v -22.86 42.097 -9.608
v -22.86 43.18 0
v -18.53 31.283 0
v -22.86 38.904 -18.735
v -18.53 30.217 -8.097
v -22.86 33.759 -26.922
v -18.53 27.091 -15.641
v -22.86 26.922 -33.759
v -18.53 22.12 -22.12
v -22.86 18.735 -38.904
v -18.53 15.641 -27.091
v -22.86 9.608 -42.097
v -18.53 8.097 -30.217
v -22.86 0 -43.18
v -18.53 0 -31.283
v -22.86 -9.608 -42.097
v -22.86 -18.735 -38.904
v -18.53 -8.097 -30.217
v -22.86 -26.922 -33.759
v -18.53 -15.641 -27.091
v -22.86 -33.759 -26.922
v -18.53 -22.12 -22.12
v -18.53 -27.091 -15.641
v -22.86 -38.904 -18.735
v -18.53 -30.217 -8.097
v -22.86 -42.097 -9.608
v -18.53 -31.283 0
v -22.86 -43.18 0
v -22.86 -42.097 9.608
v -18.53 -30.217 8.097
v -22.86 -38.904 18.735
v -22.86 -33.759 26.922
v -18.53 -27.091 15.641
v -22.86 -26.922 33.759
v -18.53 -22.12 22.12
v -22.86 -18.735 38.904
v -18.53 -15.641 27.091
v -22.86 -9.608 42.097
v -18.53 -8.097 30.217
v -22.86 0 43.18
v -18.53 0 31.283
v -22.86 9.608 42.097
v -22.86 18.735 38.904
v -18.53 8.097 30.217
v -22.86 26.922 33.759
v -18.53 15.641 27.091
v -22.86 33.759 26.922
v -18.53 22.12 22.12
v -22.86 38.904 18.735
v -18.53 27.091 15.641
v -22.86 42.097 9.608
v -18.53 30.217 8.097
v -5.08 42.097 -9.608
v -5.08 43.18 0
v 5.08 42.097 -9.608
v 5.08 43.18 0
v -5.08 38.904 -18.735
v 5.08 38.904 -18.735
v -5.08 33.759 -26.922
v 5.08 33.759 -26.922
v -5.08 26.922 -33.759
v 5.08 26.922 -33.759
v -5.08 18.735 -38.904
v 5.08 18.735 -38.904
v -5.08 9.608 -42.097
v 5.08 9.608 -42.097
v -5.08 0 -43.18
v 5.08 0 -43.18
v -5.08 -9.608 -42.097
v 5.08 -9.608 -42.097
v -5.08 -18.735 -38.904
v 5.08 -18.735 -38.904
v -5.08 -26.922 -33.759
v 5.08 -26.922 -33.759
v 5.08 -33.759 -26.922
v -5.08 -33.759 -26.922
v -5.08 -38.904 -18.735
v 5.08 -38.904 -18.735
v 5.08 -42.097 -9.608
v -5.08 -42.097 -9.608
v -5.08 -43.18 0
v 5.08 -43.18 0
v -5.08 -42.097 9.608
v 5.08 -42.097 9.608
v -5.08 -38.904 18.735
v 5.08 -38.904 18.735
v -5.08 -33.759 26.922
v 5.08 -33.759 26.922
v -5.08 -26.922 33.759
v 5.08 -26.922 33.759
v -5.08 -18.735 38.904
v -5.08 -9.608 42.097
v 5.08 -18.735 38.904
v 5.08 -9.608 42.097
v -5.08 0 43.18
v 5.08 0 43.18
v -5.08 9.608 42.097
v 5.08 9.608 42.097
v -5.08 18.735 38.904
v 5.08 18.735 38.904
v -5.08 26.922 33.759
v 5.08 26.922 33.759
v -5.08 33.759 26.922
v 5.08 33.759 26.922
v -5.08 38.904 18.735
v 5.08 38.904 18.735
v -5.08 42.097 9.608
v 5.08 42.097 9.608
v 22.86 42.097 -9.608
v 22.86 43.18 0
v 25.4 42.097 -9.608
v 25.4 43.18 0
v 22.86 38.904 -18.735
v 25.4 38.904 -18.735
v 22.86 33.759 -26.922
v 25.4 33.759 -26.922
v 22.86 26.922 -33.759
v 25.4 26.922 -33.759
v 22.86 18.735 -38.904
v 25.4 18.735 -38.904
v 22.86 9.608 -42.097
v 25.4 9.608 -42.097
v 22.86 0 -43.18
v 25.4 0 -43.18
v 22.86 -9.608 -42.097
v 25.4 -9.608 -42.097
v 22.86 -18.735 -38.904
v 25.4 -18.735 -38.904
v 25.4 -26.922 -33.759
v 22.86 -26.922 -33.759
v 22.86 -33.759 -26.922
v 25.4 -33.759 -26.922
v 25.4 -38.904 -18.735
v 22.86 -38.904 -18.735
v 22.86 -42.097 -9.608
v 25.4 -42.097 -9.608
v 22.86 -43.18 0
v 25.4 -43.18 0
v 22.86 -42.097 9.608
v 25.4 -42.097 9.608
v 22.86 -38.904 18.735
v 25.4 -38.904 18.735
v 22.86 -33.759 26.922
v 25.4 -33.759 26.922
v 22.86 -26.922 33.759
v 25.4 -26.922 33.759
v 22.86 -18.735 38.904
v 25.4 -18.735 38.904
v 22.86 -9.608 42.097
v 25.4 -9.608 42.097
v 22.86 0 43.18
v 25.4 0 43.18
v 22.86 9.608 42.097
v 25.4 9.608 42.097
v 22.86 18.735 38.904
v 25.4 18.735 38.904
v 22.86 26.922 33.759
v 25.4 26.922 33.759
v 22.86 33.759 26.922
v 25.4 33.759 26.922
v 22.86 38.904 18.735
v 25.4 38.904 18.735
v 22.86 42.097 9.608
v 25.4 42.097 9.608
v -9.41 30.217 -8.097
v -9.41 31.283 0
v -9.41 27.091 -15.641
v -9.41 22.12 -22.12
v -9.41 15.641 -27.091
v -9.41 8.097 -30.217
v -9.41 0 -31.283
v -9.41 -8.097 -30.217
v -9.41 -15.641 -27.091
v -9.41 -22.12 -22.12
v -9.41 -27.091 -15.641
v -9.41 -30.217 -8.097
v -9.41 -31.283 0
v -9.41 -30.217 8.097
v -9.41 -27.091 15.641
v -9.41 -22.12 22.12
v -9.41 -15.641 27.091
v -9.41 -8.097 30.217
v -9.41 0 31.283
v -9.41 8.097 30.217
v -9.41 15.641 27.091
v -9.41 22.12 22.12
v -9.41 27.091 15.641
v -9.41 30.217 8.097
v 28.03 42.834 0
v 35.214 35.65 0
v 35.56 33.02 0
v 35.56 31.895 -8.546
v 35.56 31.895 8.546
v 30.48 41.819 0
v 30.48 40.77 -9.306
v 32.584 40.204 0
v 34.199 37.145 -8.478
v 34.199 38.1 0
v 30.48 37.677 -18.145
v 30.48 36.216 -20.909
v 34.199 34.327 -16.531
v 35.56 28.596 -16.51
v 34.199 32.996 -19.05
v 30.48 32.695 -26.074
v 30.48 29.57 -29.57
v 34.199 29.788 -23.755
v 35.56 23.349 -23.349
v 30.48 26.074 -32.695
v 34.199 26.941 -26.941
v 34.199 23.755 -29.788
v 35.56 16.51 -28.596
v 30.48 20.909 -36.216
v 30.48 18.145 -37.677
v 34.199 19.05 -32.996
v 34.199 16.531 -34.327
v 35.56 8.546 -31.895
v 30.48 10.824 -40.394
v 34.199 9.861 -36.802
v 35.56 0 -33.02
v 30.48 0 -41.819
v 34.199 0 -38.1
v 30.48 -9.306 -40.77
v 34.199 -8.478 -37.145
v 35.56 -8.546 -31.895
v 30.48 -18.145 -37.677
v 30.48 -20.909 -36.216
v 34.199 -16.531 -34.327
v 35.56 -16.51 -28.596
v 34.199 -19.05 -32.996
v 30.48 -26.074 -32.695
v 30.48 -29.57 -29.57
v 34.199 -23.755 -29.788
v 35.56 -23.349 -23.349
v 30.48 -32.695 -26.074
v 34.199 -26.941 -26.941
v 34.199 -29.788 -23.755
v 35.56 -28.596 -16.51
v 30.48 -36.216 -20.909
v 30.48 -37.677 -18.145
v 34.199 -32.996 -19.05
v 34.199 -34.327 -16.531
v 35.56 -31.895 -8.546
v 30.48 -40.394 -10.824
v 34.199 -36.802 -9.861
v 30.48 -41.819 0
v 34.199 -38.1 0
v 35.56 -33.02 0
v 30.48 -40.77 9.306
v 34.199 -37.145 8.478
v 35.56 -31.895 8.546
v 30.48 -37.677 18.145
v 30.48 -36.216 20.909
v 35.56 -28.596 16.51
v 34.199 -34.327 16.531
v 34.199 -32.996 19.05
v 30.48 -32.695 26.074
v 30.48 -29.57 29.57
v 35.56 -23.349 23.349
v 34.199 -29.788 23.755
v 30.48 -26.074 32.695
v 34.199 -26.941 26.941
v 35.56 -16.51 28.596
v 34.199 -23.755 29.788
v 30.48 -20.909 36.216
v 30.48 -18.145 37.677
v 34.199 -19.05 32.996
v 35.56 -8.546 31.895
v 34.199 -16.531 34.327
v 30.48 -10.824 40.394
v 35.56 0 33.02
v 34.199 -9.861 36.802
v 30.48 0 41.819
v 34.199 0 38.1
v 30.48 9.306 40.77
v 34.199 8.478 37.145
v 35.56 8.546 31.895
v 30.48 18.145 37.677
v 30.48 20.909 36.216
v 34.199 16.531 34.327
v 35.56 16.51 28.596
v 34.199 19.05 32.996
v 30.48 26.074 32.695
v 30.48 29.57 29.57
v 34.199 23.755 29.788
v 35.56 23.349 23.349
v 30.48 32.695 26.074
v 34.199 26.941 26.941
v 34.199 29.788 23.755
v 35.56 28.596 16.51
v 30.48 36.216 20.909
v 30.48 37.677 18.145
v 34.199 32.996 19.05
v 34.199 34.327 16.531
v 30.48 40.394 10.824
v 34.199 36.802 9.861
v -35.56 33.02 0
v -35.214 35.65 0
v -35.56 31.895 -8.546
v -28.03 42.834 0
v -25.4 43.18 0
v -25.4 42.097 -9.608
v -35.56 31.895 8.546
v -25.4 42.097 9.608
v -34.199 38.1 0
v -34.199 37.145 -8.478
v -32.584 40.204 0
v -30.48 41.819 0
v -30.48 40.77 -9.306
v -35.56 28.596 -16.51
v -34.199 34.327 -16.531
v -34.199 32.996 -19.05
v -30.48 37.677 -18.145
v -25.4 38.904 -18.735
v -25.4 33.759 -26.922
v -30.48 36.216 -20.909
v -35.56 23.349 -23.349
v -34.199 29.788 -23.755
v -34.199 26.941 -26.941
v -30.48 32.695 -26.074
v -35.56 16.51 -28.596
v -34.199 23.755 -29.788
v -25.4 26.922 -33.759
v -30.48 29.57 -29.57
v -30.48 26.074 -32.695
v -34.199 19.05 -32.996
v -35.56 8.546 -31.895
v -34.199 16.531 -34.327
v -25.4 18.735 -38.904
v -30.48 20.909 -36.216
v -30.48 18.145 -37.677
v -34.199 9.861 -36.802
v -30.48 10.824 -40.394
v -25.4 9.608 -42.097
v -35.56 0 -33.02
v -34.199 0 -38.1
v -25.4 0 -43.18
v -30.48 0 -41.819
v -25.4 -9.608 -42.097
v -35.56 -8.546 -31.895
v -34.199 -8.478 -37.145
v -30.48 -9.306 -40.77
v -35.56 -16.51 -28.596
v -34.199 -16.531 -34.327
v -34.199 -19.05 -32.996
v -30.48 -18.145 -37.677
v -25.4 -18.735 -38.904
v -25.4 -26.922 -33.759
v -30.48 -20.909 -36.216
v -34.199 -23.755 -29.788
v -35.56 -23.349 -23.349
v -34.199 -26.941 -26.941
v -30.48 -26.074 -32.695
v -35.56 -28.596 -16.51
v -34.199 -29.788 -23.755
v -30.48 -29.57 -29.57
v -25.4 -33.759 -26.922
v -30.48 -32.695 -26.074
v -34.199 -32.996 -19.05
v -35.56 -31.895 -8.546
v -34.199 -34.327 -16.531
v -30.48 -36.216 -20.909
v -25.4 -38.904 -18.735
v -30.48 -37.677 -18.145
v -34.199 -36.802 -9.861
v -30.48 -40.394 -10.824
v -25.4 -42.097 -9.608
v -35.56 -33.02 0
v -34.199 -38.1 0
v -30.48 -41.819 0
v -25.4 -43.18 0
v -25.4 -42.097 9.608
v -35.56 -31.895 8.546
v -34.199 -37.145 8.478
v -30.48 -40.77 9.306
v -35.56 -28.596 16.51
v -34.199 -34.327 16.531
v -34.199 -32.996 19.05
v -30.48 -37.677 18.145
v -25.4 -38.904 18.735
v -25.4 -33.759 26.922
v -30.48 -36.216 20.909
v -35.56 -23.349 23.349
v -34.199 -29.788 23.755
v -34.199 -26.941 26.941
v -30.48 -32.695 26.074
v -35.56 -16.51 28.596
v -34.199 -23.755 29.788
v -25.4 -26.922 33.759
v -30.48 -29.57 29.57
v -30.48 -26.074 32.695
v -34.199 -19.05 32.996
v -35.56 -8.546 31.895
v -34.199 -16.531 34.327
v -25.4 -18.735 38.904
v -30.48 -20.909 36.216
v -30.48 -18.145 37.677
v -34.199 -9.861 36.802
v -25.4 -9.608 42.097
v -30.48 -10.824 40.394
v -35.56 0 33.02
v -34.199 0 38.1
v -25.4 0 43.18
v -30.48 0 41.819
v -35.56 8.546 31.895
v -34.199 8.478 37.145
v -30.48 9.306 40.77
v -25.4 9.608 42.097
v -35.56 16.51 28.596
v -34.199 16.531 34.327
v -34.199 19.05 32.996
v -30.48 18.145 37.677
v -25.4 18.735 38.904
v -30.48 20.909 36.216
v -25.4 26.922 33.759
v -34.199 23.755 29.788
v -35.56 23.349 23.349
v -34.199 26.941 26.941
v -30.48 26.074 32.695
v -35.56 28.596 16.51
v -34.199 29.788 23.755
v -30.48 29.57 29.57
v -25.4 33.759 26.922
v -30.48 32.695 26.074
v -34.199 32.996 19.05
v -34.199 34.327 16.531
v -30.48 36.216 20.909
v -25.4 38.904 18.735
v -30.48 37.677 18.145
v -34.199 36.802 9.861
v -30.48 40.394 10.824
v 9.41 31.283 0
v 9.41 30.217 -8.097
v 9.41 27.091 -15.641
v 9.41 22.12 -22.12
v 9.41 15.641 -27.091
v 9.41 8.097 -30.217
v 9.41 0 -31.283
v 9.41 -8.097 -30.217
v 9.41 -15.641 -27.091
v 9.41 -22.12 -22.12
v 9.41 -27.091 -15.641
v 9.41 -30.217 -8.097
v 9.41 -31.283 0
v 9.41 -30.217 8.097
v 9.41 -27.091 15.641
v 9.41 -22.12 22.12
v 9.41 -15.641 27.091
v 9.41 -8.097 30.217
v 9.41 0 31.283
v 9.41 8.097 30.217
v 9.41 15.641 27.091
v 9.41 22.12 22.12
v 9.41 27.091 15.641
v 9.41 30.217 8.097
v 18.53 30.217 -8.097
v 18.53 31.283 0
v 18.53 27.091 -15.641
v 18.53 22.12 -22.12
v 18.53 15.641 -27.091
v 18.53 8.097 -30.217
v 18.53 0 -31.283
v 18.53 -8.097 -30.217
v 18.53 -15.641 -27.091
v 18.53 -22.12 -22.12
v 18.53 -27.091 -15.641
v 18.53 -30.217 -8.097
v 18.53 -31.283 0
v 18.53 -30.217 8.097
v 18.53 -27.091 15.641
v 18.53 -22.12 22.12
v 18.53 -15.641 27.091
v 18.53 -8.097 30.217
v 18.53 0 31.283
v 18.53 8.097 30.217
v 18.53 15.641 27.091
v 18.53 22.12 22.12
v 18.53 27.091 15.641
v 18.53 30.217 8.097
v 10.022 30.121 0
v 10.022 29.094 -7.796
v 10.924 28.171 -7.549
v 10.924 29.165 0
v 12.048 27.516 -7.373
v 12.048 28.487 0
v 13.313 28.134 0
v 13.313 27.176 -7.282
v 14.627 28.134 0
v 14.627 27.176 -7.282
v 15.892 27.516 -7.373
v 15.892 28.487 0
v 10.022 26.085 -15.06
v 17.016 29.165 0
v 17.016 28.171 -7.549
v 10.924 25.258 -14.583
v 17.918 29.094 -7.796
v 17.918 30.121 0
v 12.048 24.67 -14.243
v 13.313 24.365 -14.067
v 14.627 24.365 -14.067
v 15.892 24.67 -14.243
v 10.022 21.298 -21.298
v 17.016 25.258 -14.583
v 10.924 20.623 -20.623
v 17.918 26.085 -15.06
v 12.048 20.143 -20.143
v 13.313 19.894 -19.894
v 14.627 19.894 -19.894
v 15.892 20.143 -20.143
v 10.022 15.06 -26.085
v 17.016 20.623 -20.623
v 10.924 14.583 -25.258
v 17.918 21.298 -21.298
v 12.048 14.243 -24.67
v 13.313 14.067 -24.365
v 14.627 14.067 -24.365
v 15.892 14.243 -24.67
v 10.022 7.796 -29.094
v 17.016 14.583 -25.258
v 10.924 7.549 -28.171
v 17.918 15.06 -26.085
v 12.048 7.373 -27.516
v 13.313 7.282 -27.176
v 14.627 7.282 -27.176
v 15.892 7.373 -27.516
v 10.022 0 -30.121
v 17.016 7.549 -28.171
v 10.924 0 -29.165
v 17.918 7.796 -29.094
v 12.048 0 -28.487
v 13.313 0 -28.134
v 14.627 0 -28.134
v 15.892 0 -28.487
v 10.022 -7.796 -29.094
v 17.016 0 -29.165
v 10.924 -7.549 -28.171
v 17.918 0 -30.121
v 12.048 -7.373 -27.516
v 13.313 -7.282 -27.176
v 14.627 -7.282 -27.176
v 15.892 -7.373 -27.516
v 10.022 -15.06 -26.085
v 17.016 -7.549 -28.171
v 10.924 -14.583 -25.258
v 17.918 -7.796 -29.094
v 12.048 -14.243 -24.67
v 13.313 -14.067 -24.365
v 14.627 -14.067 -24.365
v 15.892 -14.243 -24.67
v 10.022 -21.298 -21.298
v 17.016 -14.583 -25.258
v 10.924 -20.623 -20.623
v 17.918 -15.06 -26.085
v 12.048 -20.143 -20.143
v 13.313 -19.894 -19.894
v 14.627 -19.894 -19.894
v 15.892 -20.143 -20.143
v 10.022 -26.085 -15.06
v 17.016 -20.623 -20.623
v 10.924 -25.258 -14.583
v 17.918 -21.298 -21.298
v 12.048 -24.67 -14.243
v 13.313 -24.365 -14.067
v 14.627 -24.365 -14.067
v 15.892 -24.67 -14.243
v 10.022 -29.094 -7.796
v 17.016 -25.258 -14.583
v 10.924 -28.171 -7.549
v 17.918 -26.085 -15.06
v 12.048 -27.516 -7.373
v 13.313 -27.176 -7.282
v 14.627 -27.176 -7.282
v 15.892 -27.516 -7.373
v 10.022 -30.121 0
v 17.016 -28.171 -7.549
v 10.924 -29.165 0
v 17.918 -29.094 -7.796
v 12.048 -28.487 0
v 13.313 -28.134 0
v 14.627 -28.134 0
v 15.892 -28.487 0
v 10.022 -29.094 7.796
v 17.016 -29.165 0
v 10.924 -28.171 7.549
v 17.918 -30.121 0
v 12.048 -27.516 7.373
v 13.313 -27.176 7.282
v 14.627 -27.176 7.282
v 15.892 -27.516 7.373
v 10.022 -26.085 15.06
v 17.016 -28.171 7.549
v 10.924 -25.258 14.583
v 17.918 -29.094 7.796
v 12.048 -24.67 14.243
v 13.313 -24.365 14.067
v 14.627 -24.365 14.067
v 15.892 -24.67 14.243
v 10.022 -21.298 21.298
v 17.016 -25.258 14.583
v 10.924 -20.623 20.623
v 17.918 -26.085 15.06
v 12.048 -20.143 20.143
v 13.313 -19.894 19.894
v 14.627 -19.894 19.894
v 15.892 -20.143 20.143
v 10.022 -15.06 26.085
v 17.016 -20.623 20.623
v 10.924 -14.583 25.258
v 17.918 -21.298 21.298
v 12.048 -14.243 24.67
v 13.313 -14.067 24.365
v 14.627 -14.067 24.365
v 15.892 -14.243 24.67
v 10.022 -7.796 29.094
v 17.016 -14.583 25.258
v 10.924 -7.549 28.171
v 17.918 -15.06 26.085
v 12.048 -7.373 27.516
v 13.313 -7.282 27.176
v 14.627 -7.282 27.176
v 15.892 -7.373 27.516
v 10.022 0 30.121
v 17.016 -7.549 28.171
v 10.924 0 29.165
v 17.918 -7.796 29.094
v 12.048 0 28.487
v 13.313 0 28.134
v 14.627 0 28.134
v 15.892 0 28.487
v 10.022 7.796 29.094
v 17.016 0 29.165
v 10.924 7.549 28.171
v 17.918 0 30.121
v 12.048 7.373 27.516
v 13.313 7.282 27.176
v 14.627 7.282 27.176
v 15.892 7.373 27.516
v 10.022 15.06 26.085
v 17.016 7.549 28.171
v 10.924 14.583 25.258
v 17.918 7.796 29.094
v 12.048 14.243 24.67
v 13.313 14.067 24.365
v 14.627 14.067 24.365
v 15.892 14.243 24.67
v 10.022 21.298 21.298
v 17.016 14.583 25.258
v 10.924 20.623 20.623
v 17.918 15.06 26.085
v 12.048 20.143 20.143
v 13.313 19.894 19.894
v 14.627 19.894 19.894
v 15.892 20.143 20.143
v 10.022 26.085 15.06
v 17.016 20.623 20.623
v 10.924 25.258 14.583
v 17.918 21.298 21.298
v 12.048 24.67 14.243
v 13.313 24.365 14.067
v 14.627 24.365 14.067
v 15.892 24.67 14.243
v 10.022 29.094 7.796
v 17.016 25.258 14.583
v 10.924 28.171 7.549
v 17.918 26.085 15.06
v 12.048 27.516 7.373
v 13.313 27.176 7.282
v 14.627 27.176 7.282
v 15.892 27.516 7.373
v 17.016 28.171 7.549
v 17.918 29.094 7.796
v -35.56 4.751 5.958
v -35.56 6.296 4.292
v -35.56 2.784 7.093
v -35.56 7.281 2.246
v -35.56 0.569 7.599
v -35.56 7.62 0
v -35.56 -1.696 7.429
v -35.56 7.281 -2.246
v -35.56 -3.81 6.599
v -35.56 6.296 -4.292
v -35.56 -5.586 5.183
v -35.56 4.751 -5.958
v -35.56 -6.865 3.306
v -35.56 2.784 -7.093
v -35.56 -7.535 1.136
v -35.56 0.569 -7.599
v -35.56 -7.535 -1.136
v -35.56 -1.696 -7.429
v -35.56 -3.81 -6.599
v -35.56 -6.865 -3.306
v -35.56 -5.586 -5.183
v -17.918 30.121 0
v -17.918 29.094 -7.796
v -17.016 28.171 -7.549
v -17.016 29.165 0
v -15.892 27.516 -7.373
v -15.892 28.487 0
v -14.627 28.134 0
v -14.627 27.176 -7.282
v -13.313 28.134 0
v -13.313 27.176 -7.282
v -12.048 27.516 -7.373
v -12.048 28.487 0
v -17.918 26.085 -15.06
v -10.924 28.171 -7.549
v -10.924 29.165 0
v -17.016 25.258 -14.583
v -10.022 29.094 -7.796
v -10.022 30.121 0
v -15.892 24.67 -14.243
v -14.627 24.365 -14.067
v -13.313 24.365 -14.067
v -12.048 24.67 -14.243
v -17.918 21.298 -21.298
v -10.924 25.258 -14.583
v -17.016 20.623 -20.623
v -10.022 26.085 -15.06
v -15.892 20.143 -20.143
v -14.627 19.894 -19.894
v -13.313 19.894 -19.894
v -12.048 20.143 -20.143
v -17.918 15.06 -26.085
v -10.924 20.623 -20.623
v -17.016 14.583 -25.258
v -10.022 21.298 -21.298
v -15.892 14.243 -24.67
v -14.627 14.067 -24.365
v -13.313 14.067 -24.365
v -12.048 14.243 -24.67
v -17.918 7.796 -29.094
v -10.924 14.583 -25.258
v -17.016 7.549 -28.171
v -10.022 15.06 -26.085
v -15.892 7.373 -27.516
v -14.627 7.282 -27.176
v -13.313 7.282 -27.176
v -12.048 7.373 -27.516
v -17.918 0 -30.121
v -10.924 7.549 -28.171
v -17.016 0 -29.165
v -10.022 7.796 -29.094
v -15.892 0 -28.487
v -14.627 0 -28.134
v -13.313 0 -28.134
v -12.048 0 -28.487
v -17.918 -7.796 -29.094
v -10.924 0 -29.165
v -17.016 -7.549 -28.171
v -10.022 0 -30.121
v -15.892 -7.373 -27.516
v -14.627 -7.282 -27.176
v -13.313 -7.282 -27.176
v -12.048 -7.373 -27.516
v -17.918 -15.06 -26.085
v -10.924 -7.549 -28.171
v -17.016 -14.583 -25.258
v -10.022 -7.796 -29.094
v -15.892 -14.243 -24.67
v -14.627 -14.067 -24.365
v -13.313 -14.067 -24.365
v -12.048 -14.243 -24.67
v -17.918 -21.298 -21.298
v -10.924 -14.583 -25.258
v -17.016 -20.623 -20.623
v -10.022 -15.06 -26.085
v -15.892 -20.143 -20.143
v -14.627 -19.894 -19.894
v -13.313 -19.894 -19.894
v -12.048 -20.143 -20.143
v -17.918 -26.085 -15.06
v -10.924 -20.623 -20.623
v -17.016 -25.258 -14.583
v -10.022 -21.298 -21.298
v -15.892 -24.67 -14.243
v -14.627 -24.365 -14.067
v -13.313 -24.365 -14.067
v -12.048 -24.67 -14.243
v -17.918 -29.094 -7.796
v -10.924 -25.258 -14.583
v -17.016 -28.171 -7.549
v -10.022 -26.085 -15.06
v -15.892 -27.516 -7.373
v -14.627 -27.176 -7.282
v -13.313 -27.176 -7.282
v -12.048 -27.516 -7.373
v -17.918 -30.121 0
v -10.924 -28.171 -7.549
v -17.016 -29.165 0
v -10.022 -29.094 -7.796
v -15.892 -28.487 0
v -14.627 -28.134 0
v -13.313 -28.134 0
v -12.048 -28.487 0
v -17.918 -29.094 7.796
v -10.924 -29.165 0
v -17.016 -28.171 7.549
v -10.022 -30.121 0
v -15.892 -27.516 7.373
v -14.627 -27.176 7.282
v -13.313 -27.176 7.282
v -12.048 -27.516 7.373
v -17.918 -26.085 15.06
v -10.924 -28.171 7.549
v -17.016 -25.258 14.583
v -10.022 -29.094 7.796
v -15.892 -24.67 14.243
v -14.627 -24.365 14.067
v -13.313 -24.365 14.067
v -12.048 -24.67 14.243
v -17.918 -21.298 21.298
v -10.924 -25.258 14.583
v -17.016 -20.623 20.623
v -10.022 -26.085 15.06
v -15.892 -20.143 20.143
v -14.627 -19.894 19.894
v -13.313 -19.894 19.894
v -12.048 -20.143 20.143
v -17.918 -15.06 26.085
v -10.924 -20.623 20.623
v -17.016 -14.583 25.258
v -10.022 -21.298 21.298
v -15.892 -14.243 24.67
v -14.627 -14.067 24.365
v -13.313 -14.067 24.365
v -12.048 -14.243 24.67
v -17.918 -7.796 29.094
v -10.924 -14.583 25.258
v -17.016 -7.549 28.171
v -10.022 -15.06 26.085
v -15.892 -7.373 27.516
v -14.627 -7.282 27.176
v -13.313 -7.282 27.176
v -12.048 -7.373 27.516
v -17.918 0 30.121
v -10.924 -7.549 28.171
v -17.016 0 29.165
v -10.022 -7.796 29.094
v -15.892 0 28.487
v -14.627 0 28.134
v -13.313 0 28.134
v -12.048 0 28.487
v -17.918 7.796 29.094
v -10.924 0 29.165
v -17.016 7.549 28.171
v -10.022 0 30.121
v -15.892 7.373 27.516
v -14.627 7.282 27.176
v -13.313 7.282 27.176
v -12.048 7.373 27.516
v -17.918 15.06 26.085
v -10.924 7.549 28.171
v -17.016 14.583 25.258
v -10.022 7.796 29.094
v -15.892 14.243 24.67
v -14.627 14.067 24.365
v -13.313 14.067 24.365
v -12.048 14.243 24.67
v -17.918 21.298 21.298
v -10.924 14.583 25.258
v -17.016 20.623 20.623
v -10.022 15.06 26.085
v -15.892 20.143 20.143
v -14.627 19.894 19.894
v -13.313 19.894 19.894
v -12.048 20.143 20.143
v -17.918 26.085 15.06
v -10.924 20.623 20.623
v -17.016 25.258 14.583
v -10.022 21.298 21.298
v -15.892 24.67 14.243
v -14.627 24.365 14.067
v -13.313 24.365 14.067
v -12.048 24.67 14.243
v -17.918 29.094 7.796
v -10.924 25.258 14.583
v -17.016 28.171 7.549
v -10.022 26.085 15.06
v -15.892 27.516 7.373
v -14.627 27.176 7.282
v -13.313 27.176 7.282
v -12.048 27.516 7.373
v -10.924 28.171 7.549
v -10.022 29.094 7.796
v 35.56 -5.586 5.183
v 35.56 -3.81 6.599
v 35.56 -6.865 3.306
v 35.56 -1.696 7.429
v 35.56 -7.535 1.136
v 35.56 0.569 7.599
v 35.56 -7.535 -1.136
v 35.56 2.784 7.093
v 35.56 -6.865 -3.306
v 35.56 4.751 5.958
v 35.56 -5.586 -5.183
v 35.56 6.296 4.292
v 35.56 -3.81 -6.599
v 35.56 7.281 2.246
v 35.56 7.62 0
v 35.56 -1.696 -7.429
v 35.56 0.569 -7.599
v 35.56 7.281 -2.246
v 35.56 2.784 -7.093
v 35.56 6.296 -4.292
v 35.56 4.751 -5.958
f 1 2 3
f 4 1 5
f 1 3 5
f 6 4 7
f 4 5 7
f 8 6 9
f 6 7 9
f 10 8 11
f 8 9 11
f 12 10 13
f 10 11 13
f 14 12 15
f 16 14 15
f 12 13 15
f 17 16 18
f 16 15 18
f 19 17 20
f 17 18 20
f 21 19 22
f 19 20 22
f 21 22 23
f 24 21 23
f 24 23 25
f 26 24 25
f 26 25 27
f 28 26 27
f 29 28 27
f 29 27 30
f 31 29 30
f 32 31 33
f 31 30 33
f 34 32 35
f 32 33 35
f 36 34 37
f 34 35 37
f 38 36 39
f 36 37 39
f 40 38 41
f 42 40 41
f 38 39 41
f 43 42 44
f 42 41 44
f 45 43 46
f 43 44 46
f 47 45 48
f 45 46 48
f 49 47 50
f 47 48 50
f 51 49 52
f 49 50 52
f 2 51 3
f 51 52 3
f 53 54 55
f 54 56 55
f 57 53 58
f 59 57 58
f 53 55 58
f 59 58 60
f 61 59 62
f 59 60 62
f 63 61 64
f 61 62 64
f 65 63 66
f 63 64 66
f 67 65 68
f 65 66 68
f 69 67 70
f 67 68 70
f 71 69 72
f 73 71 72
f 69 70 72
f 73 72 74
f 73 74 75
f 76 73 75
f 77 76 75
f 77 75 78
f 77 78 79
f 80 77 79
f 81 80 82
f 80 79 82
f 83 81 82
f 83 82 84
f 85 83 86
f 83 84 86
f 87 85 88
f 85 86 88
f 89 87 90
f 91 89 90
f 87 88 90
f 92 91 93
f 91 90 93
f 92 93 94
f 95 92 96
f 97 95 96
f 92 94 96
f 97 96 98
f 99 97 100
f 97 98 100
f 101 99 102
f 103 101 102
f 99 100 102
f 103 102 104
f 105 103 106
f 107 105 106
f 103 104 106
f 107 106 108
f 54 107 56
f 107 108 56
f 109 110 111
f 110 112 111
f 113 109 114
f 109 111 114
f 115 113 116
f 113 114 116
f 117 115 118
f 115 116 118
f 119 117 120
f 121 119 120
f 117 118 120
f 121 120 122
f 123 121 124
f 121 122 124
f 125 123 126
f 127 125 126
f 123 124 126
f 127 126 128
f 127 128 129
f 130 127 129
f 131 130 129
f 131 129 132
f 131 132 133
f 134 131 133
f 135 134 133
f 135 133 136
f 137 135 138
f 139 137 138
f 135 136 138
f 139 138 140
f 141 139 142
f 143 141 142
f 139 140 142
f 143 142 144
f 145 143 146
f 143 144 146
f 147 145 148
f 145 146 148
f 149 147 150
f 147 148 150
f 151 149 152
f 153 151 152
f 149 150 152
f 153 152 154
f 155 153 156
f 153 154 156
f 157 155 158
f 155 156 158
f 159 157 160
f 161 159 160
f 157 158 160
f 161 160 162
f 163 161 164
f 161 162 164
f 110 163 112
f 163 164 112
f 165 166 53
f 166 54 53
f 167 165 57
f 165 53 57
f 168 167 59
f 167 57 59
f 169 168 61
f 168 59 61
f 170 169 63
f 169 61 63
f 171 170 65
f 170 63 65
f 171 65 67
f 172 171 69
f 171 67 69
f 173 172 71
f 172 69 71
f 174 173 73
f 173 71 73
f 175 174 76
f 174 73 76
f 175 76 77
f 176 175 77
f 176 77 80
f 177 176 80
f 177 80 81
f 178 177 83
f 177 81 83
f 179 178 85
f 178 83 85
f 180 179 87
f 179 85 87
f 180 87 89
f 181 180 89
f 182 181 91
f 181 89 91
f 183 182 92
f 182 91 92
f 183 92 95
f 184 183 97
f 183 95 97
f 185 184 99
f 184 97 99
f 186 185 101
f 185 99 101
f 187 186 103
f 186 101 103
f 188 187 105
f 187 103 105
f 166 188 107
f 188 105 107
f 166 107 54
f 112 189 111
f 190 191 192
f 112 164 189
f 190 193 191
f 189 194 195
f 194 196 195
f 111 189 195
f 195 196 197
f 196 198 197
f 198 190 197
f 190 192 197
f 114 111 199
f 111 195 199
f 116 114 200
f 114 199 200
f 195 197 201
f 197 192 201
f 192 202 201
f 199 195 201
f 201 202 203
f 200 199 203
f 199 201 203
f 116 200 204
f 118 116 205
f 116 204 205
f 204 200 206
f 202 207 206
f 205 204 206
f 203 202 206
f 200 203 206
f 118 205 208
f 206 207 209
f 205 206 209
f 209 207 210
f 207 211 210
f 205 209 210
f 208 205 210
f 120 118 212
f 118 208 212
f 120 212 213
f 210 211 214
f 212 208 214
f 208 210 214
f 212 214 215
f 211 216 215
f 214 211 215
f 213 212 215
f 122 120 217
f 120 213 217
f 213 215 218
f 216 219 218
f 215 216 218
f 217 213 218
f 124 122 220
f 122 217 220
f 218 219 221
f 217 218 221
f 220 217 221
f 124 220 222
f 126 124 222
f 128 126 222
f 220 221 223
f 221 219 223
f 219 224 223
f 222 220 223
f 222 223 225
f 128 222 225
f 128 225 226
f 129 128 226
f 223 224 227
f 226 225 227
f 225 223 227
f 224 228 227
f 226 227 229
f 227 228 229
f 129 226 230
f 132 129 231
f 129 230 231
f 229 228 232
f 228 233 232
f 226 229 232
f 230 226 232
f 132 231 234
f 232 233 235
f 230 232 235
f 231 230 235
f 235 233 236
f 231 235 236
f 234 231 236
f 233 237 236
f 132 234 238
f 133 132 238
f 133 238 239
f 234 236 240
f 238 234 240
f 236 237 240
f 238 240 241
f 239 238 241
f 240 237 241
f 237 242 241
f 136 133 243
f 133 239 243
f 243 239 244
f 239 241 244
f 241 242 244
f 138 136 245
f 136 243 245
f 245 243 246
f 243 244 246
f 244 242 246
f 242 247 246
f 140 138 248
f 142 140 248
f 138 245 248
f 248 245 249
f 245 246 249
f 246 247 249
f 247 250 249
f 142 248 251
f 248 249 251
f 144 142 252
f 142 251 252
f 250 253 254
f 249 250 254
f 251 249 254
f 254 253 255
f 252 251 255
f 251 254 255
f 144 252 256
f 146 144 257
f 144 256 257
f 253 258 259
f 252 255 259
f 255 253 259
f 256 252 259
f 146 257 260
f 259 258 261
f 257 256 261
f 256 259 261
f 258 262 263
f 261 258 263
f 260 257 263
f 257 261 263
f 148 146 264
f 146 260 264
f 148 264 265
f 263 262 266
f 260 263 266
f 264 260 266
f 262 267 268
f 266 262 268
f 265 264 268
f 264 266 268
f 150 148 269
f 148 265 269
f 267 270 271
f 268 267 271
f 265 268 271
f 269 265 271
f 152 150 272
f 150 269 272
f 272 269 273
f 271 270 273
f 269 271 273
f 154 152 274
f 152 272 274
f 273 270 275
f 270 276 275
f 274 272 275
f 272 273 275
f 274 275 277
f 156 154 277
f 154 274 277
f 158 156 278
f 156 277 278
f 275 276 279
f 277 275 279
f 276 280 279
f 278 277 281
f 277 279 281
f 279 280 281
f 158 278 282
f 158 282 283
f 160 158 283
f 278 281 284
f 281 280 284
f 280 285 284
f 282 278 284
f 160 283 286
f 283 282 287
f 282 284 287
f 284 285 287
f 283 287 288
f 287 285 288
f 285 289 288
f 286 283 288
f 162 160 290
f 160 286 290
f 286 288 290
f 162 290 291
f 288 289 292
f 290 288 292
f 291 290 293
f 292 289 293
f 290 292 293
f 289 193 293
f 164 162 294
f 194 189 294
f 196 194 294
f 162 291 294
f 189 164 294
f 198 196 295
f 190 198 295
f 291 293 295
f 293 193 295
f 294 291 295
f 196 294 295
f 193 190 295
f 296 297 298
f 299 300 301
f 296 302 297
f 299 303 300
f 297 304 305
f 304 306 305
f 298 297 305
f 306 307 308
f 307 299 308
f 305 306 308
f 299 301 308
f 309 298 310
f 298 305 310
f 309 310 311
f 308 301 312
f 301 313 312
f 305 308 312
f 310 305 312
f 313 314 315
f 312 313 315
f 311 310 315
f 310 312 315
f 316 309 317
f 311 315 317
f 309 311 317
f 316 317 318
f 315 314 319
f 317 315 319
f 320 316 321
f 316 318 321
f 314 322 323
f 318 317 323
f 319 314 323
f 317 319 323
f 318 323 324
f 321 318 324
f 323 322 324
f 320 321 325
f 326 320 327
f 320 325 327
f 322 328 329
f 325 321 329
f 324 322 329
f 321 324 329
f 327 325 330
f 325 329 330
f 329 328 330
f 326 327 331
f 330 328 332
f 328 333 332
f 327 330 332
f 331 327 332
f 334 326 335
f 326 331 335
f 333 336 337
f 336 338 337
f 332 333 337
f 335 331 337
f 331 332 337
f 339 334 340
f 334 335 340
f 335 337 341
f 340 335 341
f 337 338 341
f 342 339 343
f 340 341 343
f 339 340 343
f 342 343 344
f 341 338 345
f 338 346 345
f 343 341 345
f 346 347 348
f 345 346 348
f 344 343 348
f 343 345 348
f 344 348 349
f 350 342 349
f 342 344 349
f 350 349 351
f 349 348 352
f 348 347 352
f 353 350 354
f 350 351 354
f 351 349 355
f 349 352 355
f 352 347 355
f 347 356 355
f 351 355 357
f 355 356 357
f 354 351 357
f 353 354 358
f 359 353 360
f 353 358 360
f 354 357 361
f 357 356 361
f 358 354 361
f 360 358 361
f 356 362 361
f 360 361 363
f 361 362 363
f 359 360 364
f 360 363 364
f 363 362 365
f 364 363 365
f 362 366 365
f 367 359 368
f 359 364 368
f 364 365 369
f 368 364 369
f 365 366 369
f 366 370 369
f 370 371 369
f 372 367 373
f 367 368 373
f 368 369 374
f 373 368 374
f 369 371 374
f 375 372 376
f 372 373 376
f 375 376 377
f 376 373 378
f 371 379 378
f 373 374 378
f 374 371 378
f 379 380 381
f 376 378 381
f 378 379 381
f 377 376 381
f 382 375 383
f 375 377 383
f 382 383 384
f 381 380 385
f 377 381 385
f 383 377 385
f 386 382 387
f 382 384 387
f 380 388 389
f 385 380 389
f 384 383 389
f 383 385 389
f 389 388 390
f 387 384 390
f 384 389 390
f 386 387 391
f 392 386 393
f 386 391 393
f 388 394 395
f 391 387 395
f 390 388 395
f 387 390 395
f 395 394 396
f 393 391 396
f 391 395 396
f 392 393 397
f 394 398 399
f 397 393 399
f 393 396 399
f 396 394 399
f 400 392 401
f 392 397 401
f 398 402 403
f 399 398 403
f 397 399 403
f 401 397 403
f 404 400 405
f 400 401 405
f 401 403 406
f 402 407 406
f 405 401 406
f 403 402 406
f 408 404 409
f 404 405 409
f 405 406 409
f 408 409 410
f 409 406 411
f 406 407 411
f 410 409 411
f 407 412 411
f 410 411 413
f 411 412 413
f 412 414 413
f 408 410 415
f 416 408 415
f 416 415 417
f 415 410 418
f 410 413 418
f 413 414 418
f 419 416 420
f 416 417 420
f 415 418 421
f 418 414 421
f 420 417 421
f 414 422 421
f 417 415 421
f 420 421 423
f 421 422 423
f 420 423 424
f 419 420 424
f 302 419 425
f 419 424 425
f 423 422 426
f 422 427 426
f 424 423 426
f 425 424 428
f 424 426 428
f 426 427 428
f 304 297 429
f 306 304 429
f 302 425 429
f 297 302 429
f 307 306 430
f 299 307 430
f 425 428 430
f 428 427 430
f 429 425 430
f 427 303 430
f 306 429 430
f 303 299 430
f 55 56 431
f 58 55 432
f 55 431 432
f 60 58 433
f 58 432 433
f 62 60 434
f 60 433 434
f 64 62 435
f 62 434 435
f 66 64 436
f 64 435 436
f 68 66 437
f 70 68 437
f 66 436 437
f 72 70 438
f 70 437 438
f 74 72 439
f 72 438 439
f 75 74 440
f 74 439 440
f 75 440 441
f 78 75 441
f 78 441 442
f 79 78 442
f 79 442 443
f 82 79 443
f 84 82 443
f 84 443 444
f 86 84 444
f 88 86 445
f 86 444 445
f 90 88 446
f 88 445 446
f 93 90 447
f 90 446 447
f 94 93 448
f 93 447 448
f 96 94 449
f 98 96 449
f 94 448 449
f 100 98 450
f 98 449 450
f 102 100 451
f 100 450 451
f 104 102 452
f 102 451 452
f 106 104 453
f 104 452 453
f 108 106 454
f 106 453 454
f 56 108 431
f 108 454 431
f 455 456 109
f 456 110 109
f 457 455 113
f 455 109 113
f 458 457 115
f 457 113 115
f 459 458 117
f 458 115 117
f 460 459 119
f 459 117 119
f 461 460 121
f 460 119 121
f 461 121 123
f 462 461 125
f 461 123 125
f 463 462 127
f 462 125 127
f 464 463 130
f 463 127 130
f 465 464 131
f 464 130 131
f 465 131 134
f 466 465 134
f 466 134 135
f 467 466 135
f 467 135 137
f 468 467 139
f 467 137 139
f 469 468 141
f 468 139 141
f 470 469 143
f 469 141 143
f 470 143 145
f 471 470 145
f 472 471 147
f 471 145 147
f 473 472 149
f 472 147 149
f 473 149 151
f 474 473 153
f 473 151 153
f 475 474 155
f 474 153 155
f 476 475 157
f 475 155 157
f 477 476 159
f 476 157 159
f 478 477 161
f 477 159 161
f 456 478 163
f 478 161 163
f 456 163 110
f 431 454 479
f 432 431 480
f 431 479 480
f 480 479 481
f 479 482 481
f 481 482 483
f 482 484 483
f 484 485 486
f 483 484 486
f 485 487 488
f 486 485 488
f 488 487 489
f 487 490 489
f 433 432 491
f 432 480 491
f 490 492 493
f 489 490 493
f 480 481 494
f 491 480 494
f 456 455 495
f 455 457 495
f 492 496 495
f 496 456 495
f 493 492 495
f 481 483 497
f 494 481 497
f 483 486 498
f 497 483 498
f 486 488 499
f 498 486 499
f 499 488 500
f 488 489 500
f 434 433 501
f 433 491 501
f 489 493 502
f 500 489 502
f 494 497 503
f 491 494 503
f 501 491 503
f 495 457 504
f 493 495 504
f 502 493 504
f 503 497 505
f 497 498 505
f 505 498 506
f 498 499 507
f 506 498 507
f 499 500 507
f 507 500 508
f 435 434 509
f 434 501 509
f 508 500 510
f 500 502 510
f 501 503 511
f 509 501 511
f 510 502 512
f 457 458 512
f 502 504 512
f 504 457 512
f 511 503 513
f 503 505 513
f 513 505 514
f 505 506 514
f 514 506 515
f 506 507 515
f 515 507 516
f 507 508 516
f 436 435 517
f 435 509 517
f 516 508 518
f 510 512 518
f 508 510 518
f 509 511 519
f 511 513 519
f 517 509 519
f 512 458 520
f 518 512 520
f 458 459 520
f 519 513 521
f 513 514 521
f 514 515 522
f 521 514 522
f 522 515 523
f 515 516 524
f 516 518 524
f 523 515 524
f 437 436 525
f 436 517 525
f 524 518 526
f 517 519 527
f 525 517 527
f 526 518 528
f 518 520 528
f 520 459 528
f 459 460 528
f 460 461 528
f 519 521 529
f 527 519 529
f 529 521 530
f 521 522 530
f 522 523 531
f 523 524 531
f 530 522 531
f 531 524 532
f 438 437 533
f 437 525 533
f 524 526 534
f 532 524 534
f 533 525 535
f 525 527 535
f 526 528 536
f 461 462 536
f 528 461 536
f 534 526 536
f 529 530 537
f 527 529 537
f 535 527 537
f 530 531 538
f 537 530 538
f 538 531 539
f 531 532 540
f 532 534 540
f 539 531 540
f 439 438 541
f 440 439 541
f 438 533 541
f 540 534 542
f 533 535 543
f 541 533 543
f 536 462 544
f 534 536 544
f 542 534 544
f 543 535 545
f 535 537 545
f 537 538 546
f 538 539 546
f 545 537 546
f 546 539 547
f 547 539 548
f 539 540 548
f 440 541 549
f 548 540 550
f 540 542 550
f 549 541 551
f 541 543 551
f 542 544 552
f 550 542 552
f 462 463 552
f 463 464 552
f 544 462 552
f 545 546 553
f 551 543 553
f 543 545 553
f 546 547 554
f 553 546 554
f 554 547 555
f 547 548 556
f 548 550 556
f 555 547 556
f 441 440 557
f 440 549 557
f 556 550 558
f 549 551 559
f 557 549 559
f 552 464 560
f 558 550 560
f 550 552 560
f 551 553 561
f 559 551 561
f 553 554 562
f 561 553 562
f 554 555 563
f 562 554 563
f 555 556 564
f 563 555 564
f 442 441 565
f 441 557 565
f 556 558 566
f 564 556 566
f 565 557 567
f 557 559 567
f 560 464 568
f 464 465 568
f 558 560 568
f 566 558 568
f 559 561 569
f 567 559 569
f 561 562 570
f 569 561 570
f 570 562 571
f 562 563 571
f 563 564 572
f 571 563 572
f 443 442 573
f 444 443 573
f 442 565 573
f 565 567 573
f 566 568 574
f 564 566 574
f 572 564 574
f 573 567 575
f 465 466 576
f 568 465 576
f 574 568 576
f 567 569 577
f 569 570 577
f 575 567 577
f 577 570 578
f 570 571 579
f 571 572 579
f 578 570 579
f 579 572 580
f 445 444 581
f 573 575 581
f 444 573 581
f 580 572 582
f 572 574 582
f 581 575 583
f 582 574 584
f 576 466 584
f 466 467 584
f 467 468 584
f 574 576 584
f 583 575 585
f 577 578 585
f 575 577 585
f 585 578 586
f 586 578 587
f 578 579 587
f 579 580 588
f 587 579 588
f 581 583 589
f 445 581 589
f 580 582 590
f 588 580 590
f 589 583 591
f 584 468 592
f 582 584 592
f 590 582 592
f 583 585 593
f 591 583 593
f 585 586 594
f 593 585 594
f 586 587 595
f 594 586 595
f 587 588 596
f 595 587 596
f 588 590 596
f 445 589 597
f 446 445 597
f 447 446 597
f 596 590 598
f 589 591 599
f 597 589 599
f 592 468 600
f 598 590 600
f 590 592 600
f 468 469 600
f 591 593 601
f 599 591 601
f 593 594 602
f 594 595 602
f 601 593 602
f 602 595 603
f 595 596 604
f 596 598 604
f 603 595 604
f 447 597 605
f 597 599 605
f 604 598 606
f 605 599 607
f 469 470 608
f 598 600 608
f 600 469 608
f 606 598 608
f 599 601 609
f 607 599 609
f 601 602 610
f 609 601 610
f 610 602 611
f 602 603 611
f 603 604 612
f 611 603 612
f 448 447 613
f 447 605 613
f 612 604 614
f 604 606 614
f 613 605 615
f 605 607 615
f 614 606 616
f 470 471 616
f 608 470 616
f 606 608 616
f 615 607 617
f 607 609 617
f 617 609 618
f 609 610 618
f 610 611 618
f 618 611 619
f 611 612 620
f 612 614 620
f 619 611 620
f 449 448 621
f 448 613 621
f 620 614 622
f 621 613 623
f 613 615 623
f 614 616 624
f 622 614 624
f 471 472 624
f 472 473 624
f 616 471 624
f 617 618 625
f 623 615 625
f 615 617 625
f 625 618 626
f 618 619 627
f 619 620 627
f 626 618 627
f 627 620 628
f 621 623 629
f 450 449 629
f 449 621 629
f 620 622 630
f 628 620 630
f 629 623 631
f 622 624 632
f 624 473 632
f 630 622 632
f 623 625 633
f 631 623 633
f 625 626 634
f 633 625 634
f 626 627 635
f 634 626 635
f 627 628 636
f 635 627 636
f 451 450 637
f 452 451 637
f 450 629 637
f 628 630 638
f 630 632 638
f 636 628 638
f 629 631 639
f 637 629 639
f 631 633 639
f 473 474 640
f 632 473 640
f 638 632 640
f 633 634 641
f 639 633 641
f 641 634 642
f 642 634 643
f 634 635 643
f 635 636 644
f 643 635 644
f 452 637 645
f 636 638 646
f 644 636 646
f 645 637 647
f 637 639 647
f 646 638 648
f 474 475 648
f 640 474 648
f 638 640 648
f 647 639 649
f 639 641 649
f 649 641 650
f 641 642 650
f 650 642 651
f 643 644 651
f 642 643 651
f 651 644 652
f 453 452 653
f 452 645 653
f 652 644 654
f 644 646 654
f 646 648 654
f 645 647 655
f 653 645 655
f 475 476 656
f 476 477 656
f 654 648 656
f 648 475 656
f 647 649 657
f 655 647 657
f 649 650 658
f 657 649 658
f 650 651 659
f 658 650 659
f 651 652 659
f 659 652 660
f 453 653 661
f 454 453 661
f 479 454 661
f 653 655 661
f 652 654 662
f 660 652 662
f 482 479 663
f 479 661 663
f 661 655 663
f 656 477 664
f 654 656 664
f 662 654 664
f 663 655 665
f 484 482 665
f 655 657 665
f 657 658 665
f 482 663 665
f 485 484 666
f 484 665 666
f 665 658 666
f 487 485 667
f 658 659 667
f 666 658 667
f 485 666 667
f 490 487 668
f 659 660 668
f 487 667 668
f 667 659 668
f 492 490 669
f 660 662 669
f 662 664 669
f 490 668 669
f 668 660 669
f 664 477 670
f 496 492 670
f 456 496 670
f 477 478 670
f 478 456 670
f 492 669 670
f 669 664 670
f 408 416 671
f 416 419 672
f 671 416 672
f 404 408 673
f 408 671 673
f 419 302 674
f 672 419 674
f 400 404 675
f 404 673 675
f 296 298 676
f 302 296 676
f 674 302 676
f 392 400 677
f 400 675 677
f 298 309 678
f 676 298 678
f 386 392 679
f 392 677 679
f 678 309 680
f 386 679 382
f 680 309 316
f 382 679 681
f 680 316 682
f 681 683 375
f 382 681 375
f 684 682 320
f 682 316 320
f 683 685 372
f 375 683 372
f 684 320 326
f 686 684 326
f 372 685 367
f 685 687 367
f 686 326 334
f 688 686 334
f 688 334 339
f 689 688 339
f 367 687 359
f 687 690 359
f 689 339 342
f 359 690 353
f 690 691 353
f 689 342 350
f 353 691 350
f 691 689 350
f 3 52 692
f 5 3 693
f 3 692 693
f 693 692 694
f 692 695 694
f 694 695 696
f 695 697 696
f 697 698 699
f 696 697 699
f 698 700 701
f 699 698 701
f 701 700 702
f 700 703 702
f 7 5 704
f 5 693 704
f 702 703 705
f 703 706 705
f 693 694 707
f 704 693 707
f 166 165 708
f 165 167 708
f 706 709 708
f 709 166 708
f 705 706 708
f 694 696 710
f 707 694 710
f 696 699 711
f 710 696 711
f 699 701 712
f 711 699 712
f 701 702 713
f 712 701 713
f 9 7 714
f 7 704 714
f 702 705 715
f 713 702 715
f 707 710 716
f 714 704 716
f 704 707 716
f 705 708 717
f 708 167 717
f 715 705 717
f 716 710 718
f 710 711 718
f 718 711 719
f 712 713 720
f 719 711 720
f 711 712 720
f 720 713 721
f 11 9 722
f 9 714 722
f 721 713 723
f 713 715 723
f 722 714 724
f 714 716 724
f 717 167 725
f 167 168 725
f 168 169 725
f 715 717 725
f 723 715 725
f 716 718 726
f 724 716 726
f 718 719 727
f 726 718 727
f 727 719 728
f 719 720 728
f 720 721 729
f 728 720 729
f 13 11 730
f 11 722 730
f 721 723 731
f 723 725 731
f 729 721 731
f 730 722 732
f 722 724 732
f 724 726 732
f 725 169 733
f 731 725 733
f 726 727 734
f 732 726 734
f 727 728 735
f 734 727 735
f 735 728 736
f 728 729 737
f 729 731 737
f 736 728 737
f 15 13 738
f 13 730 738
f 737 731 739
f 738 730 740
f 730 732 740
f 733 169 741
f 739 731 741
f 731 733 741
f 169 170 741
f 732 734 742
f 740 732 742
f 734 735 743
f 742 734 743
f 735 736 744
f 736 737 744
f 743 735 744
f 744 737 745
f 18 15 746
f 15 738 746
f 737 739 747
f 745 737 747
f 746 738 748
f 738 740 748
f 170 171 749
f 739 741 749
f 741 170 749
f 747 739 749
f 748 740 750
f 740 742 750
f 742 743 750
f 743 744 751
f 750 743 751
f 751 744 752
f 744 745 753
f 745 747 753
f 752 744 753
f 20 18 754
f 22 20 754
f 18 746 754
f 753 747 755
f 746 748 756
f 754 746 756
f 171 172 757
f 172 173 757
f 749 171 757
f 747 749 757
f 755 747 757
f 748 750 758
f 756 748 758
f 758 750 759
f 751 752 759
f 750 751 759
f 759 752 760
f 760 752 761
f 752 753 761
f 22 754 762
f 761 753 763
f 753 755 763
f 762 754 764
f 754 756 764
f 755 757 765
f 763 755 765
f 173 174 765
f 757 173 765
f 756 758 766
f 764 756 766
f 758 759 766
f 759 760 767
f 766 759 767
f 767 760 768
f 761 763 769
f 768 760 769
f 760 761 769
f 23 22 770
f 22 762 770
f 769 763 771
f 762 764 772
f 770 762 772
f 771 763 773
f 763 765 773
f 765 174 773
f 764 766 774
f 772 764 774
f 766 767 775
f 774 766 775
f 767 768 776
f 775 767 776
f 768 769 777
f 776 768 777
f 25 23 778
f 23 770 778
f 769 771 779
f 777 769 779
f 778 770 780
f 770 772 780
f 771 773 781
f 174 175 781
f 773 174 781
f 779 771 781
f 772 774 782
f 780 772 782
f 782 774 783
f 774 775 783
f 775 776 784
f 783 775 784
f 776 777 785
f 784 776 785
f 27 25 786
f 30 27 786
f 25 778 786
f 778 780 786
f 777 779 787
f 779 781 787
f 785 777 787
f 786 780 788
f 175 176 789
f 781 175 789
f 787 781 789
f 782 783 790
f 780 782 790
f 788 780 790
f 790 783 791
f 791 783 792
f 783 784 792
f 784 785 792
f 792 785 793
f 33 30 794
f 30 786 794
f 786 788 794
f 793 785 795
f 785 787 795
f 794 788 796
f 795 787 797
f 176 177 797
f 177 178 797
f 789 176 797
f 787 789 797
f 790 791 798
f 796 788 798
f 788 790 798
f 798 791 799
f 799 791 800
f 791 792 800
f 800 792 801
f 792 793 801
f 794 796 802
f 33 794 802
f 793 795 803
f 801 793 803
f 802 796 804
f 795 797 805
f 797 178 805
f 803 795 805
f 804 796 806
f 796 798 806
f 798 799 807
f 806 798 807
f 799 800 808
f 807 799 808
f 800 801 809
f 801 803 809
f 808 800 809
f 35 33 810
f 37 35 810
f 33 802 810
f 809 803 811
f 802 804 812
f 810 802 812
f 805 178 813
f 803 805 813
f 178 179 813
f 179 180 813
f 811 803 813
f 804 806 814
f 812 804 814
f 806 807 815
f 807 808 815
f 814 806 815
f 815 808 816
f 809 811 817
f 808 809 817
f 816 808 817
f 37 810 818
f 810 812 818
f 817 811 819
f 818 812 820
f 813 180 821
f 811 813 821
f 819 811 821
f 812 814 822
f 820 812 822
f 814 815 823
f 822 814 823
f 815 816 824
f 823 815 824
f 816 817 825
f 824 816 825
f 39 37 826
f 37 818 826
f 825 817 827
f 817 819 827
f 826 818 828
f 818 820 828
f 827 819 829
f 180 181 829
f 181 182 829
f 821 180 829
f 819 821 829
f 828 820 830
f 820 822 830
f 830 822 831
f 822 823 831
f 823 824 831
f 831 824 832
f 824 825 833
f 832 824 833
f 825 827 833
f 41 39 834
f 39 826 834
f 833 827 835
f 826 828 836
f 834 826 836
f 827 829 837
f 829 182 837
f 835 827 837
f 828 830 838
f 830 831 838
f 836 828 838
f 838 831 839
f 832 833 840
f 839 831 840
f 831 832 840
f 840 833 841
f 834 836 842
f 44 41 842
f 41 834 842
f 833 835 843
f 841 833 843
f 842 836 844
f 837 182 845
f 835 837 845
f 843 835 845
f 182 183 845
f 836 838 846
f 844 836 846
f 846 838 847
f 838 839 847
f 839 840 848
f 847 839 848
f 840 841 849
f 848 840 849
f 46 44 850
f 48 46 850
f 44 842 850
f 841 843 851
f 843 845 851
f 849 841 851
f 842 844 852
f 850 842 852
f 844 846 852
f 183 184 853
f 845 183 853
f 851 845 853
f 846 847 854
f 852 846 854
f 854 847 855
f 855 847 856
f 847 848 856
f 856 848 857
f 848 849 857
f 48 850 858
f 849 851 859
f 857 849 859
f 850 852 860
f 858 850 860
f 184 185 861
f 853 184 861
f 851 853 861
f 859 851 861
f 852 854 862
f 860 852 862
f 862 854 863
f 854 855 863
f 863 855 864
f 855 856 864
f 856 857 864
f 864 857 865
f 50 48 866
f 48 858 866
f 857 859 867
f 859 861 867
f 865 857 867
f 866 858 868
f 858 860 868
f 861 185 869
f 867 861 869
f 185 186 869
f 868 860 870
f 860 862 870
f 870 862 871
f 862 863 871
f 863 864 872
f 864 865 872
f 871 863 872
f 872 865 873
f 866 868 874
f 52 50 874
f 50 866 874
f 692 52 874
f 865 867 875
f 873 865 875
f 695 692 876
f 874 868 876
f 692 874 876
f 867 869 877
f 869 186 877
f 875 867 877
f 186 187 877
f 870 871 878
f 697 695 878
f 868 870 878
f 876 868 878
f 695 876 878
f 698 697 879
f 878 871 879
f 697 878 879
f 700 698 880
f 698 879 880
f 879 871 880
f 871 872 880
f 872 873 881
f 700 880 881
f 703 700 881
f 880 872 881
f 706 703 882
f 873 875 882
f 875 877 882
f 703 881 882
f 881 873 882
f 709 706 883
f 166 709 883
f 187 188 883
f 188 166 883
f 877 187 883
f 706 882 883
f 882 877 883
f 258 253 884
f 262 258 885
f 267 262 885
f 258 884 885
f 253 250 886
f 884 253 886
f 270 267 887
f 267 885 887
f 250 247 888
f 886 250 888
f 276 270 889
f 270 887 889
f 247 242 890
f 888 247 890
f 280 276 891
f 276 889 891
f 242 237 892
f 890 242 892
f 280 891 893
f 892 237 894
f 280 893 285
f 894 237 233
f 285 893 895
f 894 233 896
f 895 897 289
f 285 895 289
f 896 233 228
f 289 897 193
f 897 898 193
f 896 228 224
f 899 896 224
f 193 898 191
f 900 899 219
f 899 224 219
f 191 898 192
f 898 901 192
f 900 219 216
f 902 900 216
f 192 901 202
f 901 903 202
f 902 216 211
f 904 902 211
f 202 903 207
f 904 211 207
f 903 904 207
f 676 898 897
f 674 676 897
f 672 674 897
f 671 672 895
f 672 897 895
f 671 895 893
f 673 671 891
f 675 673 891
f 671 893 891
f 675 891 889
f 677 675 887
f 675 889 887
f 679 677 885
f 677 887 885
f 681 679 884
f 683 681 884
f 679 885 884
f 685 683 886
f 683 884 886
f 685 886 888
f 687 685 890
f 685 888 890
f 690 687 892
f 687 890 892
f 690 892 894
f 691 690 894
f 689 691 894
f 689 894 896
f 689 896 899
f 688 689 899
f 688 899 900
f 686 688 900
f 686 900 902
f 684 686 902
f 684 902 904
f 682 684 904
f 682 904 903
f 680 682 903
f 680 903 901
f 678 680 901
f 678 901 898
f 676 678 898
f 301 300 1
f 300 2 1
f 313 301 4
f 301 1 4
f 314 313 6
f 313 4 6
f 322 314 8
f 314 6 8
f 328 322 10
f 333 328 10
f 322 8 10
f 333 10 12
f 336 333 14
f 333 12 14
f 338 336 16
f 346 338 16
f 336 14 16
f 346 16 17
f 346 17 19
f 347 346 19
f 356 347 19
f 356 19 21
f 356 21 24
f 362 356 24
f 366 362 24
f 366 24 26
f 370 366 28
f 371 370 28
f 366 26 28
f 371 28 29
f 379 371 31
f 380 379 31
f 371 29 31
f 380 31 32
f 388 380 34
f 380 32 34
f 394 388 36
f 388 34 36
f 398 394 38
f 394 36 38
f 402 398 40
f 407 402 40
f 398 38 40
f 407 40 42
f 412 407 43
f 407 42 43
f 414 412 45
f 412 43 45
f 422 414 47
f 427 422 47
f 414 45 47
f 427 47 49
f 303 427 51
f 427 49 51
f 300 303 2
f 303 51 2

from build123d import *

# Parameters (mm, degrees)
SKETCH5_R          = 7.62
CUT_EXTRUDE2_DEPTH = 94.739421895


with BuildPart() as part:
    # Sketch1 → Revolve1 (revolve)
    with BuildSketch(Plane.XY):
        with BuildLine():
            Line((35.56, 0), (-35.56, 0))
            Line((-35.56, 0), (-35.56, 33.02))
            ThreePointArc((-35.56, 33.02), (-32.584204897, 40.204204897), (-25.4, 43.18))
            Line((-25.4, 43.18), (-22.86, 43.18))
            Line((-22.86, 43.18), (-18.529677849, 31.282537672))
            ThreePointArc((-18.529677849, 31.282537672), (-13.97, 28.08981687), (-9.410322151, 31.282537672))
            Line((-9.410322151, 31.282537672), (-5.08, 43.18))
            Line((-5.08, 43.18), (5.08, 43.18))
            Line((5.08, 43.18), (9.410322151, 31.282537672))
            ThreePointArc((9.410322151, 31.282537672), (13.97, 28.08981687), (18.529677849, 31.282537672))
            Line((18.529677849, 31.282537672), (22.86, 43.18))
            Line((22.86, 43.18), (25.4, 43.18))
            ThreePointArc((25.4, 43.18), (32.584204897, 40.204204897), (35.56, 33.02))
            Line((35.56, 33.02), (35.56, 0))
        make_face()
    revolve(axis=Axis((35.56, 0, 0), (-1, 0, 0)))

    # Sketch5 → Cut-Extrude2 (cut, through all)
    with BuildSketch(Plane(origin=(35.56, 0, 0), x_dir=(0, 0, -1), z_dir=(1, 0, 0))):
        with Locations(Location((0, 0, 0), (0, 0, 90))):
            Circle(SKETCH5_R)
    extrude(amount=-CUT_EXTRUDE2_DEPTH, mode=Mode.SUBTRACT)


solid = part.part
